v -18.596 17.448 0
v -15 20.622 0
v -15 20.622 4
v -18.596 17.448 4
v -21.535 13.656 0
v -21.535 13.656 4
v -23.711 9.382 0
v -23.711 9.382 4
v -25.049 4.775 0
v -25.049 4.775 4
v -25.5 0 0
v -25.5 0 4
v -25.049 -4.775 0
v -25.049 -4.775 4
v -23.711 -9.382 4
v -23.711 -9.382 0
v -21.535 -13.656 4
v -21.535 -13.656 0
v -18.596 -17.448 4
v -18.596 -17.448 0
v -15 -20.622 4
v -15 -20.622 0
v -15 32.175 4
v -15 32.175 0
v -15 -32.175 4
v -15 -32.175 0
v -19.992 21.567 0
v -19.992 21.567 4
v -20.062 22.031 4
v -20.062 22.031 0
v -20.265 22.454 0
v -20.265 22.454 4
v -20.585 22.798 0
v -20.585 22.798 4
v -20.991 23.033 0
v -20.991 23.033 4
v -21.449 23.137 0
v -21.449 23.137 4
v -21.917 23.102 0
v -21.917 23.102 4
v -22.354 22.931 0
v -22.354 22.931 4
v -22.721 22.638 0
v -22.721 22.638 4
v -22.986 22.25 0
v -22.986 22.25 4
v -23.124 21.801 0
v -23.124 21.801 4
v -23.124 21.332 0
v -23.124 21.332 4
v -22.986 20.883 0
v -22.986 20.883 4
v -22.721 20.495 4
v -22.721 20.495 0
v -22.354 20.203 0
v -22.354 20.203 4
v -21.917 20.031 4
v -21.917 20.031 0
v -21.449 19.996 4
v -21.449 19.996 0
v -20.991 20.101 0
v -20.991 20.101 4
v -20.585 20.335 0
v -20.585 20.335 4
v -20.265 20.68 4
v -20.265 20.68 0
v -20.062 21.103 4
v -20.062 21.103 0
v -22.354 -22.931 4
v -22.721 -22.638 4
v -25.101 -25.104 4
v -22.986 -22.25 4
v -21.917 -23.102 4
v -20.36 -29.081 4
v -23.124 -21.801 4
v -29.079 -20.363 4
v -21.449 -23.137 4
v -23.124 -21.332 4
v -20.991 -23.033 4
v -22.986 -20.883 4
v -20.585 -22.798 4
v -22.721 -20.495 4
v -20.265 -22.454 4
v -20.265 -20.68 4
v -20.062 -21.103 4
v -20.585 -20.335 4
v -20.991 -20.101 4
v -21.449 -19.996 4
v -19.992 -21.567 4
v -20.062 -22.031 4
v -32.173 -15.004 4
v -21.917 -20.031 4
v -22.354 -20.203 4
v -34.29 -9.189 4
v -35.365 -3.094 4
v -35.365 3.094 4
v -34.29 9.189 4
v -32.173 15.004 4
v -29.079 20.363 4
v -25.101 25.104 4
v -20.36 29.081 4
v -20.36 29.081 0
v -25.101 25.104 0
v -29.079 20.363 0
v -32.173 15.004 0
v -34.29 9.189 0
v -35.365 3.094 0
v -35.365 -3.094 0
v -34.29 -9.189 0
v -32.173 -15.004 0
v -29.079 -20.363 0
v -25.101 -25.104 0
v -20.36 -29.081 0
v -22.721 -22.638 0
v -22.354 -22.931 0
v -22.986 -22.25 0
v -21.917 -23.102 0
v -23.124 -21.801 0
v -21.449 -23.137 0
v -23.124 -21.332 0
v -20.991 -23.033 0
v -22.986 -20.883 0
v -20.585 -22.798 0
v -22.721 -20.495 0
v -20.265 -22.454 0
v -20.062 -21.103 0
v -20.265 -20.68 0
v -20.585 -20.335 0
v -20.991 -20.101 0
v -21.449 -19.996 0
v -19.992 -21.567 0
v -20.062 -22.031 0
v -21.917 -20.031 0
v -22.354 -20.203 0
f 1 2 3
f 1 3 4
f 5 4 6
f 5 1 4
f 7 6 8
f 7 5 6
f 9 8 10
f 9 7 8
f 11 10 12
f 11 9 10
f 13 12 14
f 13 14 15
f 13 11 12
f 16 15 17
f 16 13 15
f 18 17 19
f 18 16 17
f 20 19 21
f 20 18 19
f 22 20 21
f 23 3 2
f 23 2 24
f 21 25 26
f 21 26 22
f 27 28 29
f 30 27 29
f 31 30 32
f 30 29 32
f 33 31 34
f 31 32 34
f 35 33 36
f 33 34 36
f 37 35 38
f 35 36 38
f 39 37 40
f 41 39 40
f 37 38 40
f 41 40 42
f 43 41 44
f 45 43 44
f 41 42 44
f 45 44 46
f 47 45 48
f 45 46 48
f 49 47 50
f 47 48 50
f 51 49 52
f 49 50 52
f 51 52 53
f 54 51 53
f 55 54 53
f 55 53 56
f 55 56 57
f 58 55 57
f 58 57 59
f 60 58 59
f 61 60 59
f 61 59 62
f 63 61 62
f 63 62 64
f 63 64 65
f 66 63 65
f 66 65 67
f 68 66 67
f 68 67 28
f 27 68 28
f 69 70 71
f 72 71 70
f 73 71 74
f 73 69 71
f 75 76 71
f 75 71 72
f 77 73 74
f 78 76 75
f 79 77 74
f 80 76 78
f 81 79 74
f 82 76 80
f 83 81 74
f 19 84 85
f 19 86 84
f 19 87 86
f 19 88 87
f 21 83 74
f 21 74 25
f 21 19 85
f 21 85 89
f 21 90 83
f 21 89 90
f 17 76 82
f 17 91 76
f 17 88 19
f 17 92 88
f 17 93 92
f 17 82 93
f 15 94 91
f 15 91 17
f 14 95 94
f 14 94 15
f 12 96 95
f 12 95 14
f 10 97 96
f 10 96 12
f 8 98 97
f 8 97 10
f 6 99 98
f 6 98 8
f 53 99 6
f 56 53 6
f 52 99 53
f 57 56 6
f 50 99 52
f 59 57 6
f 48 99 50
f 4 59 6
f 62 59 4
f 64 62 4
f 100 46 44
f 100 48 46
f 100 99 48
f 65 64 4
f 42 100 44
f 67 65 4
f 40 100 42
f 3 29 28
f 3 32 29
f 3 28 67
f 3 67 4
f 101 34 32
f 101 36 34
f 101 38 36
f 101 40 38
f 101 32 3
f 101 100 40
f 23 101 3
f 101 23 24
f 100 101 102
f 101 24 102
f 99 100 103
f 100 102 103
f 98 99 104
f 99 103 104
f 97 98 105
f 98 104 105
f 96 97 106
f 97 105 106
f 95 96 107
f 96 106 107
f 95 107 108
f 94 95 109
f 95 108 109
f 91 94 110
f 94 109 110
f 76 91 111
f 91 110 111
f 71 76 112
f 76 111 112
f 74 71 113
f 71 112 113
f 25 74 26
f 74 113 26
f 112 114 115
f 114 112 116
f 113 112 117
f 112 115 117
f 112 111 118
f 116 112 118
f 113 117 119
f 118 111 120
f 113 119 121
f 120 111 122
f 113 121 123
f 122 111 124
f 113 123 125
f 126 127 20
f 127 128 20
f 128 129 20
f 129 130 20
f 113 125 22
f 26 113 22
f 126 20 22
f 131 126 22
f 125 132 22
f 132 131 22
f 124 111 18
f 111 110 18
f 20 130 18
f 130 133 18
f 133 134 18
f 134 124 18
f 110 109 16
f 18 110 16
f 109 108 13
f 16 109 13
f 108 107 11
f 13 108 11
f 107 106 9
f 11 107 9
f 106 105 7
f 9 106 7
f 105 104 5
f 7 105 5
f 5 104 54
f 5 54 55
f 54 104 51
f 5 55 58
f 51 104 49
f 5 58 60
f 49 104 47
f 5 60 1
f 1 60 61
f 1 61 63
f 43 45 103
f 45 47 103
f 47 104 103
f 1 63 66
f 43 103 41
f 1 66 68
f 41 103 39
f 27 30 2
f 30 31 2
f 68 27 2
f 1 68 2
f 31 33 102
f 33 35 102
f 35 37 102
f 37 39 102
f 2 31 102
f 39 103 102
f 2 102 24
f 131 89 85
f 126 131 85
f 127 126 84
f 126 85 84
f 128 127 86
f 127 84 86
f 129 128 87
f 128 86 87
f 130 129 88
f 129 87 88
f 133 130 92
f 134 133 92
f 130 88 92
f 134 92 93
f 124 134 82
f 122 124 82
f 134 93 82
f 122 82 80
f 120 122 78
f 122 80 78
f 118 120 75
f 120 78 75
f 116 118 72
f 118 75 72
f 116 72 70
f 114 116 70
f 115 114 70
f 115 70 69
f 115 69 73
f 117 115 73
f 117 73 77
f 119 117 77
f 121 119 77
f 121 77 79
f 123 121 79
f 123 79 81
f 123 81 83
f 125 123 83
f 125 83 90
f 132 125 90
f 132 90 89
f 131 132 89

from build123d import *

# Parameters (mm, degrees)
SKETCH_1_R          = 35.5
SKETCH_1_R_2        = 25.5
EXTRUDE_1_DEPTH     = 4
SKETCH_2_R          = 1.575
CUT_EXTRUDE_1_DEPTH = 51.363677388
SKETCH_3_W          = 60
SKETCH_3_H          = 80
CUT_EXTRUDE_2_DEPTH = 51.363677388


with BuildPart() as part:
    # 草图1 → 凸台-拉伸1 (new body)
    with BuildSketch(Plane.XY):
        Circle(SKETCH_1_R)
        Circle(SKETCH_1_R_2, mode=Mode.SUBTRACT)
    extrude(amount=EXTRUDE_1_DEPTH)

    # 草图2 → 切除-拉伸1 (cut, through all)
    with BuildSketch(Plane.XY.offset(4)):
        with Locations((-21.566756826, 21.566756826)):
            Circle(SKETCH_2_R)
        with Locations((21.566756826, 21.566756826)):
            Circle(SKETCH_2_R)
        with Locations((21.566756826, -21.566756826)):
            Circle(SKETCH_2_R)
        with Locations((-21.566756826, -21.566756826)):
            Circle(SKETCH_2_R)
    extrude(amount=-CUT_EXTRUDE_1_DEPTH, mode=Mode.SUBTRACT)

    # 草图3 → 切除-拉伸2 (cut, through all)
    with BuildSketch(Plane.XY.offset(4)):
        with Locations((15, 0)):
            Rectangle(SKETCH_3_W, SKETCH_3_H)
    extrude(amount=-CUT_EXTRUDE_2_DEPTH, mode=Mode.SUBTRACT)


solid = part.part
